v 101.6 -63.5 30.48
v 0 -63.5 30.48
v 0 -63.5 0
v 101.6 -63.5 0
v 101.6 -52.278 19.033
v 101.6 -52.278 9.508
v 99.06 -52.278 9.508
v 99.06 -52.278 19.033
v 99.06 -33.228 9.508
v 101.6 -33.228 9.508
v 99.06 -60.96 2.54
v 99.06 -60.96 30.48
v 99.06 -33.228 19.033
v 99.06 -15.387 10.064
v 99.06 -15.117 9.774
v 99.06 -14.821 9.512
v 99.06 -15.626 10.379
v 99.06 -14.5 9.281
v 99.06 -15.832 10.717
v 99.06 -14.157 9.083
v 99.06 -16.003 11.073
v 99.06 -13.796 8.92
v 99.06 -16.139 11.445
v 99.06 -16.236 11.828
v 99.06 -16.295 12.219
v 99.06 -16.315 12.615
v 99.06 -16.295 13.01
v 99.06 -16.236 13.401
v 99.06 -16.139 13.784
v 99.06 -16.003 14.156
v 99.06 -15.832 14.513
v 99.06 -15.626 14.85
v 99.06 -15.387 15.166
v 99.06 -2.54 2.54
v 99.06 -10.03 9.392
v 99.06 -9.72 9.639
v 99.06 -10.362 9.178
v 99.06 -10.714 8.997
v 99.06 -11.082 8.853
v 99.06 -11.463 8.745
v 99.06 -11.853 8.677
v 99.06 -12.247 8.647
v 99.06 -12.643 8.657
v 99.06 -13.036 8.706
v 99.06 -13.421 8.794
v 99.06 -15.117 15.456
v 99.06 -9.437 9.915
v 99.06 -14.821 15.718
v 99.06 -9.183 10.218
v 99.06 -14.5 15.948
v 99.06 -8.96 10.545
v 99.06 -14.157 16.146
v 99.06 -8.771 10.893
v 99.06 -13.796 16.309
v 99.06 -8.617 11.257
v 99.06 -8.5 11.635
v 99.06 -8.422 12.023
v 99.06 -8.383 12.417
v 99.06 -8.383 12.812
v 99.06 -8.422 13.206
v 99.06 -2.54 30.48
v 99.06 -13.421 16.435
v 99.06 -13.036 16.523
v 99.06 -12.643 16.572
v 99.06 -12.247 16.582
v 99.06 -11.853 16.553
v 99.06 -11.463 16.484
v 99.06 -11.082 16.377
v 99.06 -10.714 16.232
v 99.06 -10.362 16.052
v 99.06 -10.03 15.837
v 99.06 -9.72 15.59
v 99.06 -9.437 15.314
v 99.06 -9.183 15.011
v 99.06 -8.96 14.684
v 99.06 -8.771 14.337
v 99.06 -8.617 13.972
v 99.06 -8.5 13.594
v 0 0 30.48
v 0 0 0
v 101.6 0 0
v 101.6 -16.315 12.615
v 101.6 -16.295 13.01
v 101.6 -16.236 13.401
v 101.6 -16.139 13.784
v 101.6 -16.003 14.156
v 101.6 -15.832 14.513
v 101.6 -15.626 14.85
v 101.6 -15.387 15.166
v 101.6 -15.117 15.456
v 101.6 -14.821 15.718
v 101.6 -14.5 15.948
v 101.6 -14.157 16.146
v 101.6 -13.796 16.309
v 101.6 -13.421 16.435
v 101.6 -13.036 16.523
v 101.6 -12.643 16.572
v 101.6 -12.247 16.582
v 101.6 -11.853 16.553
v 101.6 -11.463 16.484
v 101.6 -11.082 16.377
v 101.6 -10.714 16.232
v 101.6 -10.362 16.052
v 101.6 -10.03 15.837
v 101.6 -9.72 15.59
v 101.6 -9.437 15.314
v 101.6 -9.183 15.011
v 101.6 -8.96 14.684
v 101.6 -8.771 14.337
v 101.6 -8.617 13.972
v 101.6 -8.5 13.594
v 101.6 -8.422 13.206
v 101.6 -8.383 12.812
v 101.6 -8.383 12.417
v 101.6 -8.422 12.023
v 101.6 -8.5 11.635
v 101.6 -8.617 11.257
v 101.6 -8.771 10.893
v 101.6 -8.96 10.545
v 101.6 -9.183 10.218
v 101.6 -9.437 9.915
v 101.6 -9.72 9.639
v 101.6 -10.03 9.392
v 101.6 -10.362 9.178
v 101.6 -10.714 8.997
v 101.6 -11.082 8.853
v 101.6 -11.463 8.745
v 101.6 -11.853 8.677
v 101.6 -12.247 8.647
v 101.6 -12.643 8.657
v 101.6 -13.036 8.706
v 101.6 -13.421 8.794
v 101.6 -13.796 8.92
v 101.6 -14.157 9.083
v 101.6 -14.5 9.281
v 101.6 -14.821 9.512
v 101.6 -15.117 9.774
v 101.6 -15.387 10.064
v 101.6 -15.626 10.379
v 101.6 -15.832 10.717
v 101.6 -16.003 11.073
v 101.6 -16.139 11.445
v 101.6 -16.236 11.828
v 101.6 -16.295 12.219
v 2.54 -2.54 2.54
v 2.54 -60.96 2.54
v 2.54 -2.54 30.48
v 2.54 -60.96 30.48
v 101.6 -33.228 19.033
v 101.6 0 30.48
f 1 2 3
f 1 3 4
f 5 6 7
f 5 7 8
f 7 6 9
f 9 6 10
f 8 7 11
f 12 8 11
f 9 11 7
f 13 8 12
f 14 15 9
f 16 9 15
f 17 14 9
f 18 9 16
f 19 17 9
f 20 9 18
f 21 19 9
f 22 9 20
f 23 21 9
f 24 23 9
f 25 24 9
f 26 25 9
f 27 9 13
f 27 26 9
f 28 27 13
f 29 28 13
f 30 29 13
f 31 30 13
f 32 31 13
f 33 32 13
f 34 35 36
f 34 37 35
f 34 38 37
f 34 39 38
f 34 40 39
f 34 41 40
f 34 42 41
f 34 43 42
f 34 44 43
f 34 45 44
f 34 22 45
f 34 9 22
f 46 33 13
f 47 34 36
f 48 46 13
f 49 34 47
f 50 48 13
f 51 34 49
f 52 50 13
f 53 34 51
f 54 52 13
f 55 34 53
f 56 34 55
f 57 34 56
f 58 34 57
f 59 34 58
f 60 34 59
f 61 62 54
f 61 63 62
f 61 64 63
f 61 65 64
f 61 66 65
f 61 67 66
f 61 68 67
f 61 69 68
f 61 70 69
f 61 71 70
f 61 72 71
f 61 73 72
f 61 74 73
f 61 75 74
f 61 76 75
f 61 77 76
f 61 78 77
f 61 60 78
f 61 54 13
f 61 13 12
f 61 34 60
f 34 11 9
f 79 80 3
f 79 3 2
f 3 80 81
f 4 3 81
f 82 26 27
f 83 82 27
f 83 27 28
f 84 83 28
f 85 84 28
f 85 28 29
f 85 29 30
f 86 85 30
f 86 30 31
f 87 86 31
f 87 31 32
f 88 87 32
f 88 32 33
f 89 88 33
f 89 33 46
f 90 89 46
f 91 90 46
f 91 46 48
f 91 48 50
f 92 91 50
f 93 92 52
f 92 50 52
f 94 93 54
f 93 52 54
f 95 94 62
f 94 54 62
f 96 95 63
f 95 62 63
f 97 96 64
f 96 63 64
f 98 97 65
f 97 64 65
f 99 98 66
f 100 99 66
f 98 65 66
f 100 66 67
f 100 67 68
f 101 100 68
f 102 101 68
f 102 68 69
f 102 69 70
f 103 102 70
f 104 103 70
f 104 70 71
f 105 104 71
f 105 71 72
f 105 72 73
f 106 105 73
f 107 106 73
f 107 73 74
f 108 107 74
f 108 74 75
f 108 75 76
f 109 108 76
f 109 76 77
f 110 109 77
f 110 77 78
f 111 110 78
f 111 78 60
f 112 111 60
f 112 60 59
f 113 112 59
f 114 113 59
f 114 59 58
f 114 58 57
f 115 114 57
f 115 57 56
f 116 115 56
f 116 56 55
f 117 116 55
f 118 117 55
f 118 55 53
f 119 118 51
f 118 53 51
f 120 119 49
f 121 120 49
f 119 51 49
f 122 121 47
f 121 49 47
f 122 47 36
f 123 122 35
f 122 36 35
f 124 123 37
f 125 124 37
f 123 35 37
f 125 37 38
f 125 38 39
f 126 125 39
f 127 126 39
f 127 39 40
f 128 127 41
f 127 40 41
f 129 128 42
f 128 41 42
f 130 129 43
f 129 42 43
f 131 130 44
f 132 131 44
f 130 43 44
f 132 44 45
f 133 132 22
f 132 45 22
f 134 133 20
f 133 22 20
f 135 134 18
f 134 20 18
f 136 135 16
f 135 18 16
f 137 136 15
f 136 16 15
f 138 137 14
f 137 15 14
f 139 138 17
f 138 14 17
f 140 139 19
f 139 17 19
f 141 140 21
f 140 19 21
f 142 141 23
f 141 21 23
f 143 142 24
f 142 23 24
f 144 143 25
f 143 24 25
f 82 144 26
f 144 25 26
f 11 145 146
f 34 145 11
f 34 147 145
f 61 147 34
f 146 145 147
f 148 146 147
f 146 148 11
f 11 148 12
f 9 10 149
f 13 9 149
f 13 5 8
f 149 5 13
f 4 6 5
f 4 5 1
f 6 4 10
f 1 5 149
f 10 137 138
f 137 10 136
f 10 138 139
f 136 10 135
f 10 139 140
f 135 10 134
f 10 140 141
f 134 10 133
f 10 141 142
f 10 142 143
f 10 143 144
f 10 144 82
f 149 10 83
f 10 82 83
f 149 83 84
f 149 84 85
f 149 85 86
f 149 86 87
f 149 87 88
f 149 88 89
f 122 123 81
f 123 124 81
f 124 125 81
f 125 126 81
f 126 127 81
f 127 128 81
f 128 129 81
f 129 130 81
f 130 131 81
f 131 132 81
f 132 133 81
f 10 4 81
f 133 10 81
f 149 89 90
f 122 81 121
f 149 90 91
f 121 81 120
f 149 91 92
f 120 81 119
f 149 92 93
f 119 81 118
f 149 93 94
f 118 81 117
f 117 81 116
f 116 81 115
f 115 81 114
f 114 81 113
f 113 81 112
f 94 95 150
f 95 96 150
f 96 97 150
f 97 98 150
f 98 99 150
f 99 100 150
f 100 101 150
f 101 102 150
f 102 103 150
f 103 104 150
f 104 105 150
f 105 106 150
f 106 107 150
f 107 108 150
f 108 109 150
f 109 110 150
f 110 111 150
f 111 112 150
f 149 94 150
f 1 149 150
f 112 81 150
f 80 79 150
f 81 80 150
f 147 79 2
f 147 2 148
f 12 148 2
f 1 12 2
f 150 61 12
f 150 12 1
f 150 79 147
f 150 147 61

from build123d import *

# Parameters (mm, degrees)
F0_W     = 101.6
F0_H     = 30.48
F1_DEPTH = 63.5
F2_T     = -2.54
F4_D     = 7.9375
F4_DEPTH = 12.7
F5_W     = 19.05
F5_H     = 9.525
F6_DEPTH = 25.4


with BuildPart() as f1:
    # F0 (on Front) → F1 (new body)
    with BuildSketch(Plane.XZ):
        with Locations((50.8, 15.24)):
            Rectangle(F0_W, F0_H)
    extrude(amount=F1_DEPTH)

    # F2
    f2_openings = [f1.faces().sort_by_distance(p)[0] for p in [
        (50.8, -31.75, 30.48),
    ]]
    offset(amount=F2_T, openings=f2_openings)

    # F4
    with Locations(Plane.YZ.offset(101.6)):
        with Locations((-12.34637, 12.614627)):
            Hole(F4_D / 2, depth=F4_DEPTH)

    # F5 (on face) → F6 (cut)
    with BuildSketch(Plane.YZ.offset(101.6)):
        with Locations((-42.752528, 14.270137)):
            Rectangle(F5_W, F5_H)
    extrude(amount=-F6_DEPTH, mode=Mode.SUBTRACT)


solid = f1.part
